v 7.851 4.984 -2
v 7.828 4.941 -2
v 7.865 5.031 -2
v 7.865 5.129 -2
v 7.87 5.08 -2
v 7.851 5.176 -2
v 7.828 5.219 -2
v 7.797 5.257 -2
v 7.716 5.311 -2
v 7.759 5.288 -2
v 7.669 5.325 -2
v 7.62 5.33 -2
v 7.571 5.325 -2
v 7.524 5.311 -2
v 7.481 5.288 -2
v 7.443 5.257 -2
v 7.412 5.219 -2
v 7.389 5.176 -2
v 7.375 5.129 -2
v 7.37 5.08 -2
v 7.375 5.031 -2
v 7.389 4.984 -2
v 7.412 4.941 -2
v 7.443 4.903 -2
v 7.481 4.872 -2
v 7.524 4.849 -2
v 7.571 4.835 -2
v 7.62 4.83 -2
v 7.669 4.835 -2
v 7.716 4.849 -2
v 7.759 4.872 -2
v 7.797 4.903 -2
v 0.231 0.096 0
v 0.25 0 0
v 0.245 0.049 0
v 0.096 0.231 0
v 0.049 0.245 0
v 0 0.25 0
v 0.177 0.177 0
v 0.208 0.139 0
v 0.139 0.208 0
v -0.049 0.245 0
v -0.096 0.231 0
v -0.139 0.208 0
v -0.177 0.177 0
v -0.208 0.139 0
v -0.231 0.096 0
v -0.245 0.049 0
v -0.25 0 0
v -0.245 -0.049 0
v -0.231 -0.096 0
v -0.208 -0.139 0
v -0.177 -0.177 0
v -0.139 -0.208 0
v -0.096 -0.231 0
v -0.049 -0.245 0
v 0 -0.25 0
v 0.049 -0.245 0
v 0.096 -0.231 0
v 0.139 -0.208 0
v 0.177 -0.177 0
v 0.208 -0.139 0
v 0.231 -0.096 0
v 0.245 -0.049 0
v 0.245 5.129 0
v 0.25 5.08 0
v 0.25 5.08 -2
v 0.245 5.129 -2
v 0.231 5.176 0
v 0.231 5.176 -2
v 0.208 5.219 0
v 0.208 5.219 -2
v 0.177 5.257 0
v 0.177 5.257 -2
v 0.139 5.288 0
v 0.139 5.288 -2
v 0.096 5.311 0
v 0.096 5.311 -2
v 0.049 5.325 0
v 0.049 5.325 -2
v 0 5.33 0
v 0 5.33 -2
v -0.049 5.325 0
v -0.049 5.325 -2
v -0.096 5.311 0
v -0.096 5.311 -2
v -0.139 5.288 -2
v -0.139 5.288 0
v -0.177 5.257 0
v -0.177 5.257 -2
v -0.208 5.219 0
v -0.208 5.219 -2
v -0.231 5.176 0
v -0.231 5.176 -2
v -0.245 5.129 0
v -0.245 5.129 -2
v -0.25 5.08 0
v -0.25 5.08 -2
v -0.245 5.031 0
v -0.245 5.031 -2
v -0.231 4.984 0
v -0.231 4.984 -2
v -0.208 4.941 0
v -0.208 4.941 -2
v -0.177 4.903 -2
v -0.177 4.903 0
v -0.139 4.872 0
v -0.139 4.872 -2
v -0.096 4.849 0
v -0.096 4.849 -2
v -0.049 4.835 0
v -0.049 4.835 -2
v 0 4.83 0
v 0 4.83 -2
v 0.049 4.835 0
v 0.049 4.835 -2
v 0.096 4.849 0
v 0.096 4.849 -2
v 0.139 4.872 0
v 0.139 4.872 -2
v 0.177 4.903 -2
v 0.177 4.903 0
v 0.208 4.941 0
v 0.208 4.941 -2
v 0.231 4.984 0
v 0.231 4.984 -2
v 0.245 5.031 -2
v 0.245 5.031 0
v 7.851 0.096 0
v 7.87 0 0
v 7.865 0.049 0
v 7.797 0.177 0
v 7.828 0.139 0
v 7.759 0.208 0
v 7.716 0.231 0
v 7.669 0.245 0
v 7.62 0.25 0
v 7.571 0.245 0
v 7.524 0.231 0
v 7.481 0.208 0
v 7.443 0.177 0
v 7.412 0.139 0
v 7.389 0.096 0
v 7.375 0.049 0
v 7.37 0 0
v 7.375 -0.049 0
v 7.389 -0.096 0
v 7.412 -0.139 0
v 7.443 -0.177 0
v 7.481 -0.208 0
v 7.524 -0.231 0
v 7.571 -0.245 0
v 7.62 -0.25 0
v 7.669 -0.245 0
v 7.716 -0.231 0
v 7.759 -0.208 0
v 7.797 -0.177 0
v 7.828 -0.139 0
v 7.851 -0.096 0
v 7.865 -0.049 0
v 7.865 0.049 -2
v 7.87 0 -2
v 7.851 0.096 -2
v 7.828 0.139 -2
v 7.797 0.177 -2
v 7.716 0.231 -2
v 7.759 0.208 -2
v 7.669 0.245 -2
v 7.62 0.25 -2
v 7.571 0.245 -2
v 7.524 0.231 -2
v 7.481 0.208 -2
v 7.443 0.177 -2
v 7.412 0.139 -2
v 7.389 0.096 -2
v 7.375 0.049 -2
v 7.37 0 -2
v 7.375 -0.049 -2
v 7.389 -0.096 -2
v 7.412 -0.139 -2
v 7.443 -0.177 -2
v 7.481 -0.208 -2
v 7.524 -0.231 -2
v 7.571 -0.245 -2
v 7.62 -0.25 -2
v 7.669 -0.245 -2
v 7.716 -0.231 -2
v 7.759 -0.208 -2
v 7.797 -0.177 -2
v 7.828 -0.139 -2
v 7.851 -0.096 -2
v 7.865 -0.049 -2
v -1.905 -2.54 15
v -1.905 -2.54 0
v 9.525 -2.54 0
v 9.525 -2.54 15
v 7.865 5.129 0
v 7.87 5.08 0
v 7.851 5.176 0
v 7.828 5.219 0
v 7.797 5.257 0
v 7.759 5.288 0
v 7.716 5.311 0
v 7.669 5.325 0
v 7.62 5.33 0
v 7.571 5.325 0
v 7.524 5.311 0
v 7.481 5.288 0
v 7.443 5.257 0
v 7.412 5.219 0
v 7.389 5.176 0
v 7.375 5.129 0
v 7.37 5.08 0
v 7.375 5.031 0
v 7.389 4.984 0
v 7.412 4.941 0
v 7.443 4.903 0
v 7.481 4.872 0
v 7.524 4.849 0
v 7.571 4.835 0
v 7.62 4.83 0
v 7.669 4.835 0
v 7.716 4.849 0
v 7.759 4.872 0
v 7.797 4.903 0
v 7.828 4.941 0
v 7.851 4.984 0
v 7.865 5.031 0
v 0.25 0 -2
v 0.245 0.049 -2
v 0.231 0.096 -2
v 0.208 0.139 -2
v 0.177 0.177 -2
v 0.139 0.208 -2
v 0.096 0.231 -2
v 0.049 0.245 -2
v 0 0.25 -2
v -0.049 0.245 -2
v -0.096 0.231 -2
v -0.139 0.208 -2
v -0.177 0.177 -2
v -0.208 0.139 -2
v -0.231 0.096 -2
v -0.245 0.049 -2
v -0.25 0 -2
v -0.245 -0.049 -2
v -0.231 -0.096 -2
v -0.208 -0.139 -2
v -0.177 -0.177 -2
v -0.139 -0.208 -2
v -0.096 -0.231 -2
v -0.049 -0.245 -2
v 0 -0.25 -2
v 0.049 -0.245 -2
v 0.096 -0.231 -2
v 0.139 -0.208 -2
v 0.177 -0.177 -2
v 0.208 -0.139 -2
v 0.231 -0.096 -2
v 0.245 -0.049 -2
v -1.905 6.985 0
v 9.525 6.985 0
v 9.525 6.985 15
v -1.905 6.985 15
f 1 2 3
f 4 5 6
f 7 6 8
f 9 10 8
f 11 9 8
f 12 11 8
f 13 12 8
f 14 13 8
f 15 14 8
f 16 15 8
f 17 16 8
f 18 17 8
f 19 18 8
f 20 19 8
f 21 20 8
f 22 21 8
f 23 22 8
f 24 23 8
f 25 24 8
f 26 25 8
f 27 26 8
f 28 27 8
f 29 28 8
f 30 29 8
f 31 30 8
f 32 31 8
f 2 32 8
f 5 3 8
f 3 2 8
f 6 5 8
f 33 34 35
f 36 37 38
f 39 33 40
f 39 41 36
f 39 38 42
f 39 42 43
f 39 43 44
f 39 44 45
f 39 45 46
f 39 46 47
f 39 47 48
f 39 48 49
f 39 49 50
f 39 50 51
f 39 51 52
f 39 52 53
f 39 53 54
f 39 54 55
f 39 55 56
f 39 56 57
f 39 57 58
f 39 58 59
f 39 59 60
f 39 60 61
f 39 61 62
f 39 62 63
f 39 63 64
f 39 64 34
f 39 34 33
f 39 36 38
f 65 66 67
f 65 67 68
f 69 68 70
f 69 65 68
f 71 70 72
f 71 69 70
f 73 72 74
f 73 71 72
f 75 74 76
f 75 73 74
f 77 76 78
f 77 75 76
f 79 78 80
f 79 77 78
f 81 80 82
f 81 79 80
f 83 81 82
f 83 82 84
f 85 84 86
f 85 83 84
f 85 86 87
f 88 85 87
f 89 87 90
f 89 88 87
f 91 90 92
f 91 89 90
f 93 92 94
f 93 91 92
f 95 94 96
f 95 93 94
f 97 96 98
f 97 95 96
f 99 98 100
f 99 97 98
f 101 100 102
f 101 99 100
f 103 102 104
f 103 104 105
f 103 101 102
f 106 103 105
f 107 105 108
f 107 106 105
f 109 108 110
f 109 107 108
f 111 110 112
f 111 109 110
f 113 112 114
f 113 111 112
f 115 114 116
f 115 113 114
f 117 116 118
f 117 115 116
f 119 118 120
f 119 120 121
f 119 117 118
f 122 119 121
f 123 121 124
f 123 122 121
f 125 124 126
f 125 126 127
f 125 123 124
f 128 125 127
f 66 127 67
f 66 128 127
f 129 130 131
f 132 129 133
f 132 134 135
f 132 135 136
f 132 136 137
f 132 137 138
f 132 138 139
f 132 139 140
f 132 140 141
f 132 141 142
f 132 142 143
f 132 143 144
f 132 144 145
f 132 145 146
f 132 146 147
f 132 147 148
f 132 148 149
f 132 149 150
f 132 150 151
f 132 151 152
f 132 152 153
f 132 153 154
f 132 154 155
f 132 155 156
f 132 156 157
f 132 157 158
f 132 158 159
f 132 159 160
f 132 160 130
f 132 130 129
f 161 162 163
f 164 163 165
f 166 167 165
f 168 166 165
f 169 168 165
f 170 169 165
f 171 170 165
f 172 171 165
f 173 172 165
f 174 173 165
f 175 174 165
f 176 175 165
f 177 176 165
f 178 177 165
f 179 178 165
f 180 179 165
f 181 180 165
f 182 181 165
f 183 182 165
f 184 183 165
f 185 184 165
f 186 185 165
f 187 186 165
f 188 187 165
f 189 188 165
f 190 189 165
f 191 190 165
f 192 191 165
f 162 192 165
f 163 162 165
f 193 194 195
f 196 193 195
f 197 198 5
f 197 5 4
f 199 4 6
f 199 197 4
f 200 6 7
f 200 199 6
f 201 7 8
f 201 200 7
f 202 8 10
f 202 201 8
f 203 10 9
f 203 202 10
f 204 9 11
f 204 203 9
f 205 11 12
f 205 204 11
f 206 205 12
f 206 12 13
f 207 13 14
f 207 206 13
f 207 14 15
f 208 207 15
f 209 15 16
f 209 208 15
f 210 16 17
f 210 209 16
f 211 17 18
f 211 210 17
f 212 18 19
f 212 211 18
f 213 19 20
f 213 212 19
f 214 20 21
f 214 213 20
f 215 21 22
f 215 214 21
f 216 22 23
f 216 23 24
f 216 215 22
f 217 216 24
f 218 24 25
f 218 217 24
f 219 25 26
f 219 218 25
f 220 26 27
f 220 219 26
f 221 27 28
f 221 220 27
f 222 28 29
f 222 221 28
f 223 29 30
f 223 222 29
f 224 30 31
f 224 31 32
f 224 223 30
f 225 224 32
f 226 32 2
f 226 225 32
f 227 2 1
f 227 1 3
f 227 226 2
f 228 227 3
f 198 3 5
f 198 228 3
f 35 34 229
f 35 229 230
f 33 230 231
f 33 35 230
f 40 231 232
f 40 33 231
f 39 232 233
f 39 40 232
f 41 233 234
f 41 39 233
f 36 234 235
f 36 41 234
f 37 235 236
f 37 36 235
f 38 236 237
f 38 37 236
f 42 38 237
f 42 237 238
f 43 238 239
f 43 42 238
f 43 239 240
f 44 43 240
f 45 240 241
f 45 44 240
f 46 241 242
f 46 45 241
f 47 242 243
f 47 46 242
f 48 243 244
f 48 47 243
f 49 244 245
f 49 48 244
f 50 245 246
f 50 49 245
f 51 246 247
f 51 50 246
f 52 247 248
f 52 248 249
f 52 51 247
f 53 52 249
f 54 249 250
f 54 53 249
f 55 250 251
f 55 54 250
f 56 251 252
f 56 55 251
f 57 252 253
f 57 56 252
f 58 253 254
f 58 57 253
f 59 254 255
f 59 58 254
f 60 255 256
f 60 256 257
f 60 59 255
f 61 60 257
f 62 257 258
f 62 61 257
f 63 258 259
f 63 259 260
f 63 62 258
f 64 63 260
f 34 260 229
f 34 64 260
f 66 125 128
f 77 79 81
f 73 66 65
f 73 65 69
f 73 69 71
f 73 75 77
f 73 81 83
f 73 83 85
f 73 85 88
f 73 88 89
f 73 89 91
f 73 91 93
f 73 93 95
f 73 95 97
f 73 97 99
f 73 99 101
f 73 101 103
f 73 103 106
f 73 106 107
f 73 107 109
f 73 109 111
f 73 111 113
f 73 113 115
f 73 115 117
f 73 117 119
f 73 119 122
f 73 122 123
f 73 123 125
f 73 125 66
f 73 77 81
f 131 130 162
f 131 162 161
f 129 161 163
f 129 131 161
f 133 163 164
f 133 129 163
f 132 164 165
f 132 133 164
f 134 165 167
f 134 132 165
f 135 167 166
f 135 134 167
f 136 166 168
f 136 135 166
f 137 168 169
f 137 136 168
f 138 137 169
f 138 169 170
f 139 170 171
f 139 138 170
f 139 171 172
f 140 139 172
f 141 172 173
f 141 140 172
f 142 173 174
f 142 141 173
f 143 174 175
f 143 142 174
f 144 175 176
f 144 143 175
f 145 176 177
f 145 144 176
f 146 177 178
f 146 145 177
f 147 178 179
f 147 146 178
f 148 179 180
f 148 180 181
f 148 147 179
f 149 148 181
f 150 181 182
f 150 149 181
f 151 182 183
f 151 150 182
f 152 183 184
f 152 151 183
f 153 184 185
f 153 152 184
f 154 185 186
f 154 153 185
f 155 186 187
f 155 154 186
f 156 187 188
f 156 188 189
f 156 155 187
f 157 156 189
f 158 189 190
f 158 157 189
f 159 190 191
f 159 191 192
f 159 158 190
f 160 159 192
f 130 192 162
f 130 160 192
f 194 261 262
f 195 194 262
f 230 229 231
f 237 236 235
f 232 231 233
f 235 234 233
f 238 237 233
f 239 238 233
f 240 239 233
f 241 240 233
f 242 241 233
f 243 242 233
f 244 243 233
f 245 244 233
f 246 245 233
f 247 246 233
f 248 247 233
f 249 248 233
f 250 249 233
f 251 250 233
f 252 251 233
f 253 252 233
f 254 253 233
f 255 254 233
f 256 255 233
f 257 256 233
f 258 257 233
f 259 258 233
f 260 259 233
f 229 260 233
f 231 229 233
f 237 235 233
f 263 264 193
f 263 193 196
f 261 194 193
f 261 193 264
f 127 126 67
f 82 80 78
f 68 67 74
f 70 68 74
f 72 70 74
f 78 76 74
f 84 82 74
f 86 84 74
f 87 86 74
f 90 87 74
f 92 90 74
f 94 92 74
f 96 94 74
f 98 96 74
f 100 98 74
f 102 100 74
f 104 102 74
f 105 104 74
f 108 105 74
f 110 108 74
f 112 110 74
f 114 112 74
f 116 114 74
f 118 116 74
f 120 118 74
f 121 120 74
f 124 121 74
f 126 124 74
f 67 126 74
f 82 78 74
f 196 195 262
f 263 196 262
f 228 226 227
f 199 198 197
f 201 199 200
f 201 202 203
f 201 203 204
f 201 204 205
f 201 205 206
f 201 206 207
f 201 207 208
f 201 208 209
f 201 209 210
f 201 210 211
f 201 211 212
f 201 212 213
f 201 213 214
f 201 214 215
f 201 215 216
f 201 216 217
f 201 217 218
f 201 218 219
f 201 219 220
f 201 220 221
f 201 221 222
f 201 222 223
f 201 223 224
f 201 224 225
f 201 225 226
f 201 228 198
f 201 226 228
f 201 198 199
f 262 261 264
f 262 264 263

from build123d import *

# Parameters (mm, degrees)
SKETCH1_W               = 11.43
SKETCH1_H               = 9.525
COMPONENT_OUTLINE_DEPTH = 15
SKETCH2_R               = 0.25
EXTRUDE_1_DEPTH         = 2
SKETCH3_R               = 0.25
EXTRUDE_2_DEPTH         = 2
SKETCH4_R               = 0.25
EXTRUDE_3_DEPTH         = 2
SKETCH5_R               = 0.25
EXTRUDE_4_DEPTH         = 2


with BuildPart() as part:
    # Sketch1 → Component_Outline (new body)
    with BuildSketch(Plane.XY):
        with Locations((3.81, 2.2225)):
            Rectangle(SKETCH1_W, SKETCH1_H)
    extrude(amount=COMPONENT_OUTLINE_DEPTH)


with BuildPart() as body_2:
    # Sketch2 → Extrude 1 (new body)
    with BuildSketch(Plane.XY):
        Circle(SKETCH2_R)
    extrude(amount=-EXTRUDE_1_DEPTH)


with BuildPart() as body_3:
    # Sketch3 → Extrude 2 (new body)
    with BuildSketch(Plane.XY):
        with Locations((0, 5.08)):
            Circle(SKETCH3_R)
    extrude(amount=-EXTRUDE_2_DEPTH)


with BuildPart() as body_4:
    # Sketch4 → Extrude 3 (new body)
    with BuildSketch(Plane.XY):
        with Locations((7.62, 5.08)):
            Circle(SKETCH4_R)
    extrude(amount=-EXTRUDE_3_DEPTH)


with BuildPart() as body_5:
    # Sketch5 → Extrude 4 (new body)
    with BuildSketch(Plane.XY):
        with Locations((7.62, 0)):
            Circle(SKETCH5_R)
    extrude(amount=-EXTRUDE_4_DEPTH)


solid = Compound([part.part, body_2.part, body_3.part, body_4.part, body_5.part])
